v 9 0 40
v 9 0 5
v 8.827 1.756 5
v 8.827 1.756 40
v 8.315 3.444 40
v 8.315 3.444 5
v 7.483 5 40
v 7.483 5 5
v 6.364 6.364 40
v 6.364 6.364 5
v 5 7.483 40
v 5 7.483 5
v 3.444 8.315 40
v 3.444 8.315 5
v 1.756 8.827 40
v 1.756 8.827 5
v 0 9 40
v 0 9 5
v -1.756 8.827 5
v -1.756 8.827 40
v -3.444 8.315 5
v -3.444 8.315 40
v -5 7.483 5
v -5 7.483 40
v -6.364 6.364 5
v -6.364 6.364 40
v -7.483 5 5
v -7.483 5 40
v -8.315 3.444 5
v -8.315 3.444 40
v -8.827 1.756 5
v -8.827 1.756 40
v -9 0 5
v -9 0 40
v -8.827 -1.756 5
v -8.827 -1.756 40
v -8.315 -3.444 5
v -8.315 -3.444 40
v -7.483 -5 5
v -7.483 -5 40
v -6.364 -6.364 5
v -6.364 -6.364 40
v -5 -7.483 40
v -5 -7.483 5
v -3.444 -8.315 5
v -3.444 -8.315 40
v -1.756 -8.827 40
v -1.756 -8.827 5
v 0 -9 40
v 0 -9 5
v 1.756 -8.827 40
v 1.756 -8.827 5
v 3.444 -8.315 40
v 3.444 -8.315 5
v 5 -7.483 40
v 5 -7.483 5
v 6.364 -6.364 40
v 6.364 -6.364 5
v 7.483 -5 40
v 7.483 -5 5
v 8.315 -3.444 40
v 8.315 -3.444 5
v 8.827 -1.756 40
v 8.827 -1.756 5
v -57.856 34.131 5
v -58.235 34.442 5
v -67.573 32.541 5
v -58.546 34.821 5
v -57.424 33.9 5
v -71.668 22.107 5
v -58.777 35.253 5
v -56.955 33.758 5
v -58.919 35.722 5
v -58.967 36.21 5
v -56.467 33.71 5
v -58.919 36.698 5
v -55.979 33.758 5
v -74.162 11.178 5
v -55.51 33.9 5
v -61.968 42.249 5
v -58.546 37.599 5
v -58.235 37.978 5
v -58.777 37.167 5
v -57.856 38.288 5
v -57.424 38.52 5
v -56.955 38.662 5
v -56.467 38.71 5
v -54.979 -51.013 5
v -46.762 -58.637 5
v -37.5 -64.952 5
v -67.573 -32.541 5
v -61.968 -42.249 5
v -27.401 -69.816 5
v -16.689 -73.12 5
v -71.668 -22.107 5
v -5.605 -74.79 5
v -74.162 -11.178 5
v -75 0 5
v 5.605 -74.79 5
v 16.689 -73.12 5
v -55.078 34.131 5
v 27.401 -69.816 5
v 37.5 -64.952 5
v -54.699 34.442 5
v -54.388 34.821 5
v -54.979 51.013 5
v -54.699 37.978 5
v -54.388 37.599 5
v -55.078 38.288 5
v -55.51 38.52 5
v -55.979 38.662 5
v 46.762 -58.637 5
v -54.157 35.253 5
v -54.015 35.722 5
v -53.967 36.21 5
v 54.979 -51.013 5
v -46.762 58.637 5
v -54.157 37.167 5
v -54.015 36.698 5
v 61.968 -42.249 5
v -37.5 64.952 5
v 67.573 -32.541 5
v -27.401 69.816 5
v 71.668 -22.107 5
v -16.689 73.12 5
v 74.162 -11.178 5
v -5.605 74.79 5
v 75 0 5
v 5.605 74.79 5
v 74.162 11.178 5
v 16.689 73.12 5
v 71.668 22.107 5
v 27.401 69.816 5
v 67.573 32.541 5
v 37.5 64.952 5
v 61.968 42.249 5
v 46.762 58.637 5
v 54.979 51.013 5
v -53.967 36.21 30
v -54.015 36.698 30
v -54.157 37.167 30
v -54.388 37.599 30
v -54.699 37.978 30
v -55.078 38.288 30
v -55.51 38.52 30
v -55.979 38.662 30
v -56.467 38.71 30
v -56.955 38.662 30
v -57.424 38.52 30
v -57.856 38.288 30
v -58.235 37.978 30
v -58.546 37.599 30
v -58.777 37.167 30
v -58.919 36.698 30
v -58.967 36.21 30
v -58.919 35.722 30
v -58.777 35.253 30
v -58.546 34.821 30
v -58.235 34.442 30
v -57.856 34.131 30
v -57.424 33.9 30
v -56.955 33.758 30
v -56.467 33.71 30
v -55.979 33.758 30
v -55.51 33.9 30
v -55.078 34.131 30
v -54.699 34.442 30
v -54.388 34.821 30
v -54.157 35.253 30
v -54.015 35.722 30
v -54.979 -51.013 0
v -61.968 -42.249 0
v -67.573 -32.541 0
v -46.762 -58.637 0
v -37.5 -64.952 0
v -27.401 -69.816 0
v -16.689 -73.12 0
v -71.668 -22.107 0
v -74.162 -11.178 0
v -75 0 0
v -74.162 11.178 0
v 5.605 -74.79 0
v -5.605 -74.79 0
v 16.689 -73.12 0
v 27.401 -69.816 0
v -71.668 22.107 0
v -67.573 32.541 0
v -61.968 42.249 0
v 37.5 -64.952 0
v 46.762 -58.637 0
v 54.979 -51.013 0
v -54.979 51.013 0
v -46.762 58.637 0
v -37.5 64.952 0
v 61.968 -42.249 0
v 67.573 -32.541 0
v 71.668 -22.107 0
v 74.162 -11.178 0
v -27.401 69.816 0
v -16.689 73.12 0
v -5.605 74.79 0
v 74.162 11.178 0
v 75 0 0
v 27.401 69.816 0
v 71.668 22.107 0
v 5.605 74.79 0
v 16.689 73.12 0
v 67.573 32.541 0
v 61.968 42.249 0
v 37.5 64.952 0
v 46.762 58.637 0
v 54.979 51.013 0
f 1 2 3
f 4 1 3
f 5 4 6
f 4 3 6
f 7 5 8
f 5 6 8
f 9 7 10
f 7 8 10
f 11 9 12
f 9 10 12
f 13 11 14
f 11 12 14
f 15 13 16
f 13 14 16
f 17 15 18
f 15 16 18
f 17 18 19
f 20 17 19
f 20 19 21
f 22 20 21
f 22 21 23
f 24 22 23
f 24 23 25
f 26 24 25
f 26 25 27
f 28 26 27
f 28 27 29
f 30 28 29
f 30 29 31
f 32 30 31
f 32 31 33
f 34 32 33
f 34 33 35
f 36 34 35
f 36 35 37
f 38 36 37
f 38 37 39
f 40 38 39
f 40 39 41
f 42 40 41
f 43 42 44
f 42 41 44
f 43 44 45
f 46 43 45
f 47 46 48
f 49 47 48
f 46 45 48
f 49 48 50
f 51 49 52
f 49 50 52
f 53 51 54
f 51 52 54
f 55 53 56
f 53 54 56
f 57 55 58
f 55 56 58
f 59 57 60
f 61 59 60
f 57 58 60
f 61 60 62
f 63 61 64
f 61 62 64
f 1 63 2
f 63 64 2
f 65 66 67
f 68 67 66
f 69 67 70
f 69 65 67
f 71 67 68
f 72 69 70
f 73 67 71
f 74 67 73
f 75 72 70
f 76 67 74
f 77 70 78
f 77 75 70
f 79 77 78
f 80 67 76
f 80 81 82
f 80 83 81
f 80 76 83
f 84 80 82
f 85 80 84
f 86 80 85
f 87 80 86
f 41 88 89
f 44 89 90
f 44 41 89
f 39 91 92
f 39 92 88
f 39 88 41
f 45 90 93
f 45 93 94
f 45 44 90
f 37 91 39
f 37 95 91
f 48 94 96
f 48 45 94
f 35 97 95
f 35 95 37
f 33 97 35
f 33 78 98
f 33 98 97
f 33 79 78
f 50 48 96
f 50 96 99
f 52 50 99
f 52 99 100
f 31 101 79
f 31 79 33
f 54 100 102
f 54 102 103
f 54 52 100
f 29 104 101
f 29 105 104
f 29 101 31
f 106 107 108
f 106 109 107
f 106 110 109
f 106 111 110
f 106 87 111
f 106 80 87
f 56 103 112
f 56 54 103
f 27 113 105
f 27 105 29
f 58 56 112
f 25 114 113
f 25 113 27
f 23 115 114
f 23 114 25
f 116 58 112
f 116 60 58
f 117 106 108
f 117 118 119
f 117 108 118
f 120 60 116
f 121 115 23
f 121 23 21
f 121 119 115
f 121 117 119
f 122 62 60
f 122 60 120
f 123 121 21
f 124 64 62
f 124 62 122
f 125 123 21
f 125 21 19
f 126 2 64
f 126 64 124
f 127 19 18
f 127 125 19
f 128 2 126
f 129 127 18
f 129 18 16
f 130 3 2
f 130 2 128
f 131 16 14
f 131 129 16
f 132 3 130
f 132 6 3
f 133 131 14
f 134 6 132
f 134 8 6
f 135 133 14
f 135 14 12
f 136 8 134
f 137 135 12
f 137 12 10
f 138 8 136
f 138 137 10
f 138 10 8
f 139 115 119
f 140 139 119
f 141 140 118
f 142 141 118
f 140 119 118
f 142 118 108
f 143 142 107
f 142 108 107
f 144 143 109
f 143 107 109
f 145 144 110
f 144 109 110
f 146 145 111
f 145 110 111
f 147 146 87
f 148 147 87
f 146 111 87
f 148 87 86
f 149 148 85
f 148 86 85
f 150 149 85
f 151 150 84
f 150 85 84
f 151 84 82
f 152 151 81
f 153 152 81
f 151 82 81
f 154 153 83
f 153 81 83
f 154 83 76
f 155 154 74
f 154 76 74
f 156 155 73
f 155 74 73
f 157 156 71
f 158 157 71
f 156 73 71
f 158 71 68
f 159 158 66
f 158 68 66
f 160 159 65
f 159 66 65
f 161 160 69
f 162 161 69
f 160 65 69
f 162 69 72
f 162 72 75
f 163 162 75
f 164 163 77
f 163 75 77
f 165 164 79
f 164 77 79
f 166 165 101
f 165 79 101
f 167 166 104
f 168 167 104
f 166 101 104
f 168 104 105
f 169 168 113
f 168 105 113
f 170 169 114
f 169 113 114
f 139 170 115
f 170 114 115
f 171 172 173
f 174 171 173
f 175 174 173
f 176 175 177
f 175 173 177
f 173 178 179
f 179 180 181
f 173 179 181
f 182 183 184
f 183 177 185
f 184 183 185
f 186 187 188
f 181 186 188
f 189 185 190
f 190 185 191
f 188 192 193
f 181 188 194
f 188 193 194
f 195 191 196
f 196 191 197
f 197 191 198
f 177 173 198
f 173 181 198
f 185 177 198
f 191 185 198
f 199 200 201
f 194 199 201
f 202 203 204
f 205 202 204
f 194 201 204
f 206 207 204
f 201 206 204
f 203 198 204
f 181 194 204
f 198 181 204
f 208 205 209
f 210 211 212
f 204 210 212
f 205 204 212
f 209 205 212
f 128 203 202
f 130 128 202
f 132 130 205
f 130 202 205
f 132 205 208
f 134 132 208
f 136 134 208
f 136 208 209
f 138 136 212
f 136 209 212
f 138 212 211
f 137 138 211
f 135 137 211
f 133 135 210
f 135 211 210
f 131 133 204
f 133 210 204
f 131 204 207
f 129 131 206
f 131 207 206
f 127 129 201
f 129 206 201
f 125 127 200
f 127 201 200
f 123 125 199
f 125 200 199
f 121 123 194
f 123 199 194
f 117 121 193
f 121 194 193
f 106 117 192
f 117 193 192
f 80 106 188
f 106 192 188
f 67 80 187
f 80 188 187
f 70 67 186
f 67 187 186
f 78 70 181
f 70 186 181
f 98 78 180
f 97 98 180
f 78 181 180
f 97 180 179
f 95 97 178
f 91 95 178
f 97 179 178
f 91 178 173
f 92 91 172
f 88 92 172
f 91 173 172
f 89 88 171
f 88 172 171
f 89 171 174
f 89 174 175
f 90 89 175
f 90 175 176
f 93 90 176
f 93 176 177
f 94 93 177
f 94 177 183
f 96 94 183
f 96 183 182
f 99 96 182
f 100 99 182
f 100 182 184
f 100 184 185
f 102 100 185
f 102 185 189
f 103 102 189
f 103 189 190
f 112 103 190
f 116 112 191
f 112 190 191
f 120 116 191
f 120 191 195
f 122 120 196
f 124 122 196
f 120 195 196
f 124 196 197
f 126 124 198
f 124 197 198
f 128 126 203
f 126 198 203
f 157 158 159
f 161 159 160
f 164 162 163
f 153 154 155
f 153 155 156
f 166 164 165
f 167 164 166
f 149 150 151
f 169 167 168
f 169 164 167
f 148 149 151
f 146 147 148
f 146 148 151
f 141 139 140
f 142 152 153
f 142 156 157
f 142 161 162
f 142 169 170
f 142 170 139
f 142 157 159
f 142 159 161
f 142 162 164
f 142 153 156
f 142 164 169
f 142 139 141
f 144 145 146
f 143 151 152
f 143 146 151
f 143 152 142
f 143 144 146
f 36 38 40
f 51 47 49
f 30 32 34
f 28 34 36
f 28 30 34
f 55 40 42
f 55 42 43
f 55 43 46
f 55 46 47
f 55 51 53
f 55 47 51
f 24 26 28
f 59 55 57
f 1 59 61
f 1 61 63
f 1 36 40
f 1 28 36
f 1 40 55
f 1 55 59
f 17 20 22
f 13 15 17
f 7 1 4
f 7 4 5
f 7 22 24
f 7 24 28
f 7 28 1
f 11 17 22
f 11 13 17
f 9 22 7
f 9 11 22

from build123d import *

# Parameters (mm, degrees)
F0_R     = 9
F1_DEPTH = 40
F2_R     = 75
F3_DEPTH = 5
F4_R     = 2.5
F5_DEPTH = 25


with BuildPart() as f1:
    # F0 (on Top) → F1 (new body)
    with BuildSketch(Plane.XY):
        Circle(F0_R)
    extrude(amount=F1_DEPTH)

    # F2 (on Top) → F3 (join)
    with BuildSketch(Plane.XY):
        Circle(F2_R)
    extrude(amount=F3_DEPTH)

    # F4 (on face) → F5 (join)
    with BuildSketch(Plane.XY.offset(5)):
        with Locations((-56.467045, 36.209807)):
            Circle(F4_R)
    extrude(amount=F5_DEPTH)


solid = f1.part
